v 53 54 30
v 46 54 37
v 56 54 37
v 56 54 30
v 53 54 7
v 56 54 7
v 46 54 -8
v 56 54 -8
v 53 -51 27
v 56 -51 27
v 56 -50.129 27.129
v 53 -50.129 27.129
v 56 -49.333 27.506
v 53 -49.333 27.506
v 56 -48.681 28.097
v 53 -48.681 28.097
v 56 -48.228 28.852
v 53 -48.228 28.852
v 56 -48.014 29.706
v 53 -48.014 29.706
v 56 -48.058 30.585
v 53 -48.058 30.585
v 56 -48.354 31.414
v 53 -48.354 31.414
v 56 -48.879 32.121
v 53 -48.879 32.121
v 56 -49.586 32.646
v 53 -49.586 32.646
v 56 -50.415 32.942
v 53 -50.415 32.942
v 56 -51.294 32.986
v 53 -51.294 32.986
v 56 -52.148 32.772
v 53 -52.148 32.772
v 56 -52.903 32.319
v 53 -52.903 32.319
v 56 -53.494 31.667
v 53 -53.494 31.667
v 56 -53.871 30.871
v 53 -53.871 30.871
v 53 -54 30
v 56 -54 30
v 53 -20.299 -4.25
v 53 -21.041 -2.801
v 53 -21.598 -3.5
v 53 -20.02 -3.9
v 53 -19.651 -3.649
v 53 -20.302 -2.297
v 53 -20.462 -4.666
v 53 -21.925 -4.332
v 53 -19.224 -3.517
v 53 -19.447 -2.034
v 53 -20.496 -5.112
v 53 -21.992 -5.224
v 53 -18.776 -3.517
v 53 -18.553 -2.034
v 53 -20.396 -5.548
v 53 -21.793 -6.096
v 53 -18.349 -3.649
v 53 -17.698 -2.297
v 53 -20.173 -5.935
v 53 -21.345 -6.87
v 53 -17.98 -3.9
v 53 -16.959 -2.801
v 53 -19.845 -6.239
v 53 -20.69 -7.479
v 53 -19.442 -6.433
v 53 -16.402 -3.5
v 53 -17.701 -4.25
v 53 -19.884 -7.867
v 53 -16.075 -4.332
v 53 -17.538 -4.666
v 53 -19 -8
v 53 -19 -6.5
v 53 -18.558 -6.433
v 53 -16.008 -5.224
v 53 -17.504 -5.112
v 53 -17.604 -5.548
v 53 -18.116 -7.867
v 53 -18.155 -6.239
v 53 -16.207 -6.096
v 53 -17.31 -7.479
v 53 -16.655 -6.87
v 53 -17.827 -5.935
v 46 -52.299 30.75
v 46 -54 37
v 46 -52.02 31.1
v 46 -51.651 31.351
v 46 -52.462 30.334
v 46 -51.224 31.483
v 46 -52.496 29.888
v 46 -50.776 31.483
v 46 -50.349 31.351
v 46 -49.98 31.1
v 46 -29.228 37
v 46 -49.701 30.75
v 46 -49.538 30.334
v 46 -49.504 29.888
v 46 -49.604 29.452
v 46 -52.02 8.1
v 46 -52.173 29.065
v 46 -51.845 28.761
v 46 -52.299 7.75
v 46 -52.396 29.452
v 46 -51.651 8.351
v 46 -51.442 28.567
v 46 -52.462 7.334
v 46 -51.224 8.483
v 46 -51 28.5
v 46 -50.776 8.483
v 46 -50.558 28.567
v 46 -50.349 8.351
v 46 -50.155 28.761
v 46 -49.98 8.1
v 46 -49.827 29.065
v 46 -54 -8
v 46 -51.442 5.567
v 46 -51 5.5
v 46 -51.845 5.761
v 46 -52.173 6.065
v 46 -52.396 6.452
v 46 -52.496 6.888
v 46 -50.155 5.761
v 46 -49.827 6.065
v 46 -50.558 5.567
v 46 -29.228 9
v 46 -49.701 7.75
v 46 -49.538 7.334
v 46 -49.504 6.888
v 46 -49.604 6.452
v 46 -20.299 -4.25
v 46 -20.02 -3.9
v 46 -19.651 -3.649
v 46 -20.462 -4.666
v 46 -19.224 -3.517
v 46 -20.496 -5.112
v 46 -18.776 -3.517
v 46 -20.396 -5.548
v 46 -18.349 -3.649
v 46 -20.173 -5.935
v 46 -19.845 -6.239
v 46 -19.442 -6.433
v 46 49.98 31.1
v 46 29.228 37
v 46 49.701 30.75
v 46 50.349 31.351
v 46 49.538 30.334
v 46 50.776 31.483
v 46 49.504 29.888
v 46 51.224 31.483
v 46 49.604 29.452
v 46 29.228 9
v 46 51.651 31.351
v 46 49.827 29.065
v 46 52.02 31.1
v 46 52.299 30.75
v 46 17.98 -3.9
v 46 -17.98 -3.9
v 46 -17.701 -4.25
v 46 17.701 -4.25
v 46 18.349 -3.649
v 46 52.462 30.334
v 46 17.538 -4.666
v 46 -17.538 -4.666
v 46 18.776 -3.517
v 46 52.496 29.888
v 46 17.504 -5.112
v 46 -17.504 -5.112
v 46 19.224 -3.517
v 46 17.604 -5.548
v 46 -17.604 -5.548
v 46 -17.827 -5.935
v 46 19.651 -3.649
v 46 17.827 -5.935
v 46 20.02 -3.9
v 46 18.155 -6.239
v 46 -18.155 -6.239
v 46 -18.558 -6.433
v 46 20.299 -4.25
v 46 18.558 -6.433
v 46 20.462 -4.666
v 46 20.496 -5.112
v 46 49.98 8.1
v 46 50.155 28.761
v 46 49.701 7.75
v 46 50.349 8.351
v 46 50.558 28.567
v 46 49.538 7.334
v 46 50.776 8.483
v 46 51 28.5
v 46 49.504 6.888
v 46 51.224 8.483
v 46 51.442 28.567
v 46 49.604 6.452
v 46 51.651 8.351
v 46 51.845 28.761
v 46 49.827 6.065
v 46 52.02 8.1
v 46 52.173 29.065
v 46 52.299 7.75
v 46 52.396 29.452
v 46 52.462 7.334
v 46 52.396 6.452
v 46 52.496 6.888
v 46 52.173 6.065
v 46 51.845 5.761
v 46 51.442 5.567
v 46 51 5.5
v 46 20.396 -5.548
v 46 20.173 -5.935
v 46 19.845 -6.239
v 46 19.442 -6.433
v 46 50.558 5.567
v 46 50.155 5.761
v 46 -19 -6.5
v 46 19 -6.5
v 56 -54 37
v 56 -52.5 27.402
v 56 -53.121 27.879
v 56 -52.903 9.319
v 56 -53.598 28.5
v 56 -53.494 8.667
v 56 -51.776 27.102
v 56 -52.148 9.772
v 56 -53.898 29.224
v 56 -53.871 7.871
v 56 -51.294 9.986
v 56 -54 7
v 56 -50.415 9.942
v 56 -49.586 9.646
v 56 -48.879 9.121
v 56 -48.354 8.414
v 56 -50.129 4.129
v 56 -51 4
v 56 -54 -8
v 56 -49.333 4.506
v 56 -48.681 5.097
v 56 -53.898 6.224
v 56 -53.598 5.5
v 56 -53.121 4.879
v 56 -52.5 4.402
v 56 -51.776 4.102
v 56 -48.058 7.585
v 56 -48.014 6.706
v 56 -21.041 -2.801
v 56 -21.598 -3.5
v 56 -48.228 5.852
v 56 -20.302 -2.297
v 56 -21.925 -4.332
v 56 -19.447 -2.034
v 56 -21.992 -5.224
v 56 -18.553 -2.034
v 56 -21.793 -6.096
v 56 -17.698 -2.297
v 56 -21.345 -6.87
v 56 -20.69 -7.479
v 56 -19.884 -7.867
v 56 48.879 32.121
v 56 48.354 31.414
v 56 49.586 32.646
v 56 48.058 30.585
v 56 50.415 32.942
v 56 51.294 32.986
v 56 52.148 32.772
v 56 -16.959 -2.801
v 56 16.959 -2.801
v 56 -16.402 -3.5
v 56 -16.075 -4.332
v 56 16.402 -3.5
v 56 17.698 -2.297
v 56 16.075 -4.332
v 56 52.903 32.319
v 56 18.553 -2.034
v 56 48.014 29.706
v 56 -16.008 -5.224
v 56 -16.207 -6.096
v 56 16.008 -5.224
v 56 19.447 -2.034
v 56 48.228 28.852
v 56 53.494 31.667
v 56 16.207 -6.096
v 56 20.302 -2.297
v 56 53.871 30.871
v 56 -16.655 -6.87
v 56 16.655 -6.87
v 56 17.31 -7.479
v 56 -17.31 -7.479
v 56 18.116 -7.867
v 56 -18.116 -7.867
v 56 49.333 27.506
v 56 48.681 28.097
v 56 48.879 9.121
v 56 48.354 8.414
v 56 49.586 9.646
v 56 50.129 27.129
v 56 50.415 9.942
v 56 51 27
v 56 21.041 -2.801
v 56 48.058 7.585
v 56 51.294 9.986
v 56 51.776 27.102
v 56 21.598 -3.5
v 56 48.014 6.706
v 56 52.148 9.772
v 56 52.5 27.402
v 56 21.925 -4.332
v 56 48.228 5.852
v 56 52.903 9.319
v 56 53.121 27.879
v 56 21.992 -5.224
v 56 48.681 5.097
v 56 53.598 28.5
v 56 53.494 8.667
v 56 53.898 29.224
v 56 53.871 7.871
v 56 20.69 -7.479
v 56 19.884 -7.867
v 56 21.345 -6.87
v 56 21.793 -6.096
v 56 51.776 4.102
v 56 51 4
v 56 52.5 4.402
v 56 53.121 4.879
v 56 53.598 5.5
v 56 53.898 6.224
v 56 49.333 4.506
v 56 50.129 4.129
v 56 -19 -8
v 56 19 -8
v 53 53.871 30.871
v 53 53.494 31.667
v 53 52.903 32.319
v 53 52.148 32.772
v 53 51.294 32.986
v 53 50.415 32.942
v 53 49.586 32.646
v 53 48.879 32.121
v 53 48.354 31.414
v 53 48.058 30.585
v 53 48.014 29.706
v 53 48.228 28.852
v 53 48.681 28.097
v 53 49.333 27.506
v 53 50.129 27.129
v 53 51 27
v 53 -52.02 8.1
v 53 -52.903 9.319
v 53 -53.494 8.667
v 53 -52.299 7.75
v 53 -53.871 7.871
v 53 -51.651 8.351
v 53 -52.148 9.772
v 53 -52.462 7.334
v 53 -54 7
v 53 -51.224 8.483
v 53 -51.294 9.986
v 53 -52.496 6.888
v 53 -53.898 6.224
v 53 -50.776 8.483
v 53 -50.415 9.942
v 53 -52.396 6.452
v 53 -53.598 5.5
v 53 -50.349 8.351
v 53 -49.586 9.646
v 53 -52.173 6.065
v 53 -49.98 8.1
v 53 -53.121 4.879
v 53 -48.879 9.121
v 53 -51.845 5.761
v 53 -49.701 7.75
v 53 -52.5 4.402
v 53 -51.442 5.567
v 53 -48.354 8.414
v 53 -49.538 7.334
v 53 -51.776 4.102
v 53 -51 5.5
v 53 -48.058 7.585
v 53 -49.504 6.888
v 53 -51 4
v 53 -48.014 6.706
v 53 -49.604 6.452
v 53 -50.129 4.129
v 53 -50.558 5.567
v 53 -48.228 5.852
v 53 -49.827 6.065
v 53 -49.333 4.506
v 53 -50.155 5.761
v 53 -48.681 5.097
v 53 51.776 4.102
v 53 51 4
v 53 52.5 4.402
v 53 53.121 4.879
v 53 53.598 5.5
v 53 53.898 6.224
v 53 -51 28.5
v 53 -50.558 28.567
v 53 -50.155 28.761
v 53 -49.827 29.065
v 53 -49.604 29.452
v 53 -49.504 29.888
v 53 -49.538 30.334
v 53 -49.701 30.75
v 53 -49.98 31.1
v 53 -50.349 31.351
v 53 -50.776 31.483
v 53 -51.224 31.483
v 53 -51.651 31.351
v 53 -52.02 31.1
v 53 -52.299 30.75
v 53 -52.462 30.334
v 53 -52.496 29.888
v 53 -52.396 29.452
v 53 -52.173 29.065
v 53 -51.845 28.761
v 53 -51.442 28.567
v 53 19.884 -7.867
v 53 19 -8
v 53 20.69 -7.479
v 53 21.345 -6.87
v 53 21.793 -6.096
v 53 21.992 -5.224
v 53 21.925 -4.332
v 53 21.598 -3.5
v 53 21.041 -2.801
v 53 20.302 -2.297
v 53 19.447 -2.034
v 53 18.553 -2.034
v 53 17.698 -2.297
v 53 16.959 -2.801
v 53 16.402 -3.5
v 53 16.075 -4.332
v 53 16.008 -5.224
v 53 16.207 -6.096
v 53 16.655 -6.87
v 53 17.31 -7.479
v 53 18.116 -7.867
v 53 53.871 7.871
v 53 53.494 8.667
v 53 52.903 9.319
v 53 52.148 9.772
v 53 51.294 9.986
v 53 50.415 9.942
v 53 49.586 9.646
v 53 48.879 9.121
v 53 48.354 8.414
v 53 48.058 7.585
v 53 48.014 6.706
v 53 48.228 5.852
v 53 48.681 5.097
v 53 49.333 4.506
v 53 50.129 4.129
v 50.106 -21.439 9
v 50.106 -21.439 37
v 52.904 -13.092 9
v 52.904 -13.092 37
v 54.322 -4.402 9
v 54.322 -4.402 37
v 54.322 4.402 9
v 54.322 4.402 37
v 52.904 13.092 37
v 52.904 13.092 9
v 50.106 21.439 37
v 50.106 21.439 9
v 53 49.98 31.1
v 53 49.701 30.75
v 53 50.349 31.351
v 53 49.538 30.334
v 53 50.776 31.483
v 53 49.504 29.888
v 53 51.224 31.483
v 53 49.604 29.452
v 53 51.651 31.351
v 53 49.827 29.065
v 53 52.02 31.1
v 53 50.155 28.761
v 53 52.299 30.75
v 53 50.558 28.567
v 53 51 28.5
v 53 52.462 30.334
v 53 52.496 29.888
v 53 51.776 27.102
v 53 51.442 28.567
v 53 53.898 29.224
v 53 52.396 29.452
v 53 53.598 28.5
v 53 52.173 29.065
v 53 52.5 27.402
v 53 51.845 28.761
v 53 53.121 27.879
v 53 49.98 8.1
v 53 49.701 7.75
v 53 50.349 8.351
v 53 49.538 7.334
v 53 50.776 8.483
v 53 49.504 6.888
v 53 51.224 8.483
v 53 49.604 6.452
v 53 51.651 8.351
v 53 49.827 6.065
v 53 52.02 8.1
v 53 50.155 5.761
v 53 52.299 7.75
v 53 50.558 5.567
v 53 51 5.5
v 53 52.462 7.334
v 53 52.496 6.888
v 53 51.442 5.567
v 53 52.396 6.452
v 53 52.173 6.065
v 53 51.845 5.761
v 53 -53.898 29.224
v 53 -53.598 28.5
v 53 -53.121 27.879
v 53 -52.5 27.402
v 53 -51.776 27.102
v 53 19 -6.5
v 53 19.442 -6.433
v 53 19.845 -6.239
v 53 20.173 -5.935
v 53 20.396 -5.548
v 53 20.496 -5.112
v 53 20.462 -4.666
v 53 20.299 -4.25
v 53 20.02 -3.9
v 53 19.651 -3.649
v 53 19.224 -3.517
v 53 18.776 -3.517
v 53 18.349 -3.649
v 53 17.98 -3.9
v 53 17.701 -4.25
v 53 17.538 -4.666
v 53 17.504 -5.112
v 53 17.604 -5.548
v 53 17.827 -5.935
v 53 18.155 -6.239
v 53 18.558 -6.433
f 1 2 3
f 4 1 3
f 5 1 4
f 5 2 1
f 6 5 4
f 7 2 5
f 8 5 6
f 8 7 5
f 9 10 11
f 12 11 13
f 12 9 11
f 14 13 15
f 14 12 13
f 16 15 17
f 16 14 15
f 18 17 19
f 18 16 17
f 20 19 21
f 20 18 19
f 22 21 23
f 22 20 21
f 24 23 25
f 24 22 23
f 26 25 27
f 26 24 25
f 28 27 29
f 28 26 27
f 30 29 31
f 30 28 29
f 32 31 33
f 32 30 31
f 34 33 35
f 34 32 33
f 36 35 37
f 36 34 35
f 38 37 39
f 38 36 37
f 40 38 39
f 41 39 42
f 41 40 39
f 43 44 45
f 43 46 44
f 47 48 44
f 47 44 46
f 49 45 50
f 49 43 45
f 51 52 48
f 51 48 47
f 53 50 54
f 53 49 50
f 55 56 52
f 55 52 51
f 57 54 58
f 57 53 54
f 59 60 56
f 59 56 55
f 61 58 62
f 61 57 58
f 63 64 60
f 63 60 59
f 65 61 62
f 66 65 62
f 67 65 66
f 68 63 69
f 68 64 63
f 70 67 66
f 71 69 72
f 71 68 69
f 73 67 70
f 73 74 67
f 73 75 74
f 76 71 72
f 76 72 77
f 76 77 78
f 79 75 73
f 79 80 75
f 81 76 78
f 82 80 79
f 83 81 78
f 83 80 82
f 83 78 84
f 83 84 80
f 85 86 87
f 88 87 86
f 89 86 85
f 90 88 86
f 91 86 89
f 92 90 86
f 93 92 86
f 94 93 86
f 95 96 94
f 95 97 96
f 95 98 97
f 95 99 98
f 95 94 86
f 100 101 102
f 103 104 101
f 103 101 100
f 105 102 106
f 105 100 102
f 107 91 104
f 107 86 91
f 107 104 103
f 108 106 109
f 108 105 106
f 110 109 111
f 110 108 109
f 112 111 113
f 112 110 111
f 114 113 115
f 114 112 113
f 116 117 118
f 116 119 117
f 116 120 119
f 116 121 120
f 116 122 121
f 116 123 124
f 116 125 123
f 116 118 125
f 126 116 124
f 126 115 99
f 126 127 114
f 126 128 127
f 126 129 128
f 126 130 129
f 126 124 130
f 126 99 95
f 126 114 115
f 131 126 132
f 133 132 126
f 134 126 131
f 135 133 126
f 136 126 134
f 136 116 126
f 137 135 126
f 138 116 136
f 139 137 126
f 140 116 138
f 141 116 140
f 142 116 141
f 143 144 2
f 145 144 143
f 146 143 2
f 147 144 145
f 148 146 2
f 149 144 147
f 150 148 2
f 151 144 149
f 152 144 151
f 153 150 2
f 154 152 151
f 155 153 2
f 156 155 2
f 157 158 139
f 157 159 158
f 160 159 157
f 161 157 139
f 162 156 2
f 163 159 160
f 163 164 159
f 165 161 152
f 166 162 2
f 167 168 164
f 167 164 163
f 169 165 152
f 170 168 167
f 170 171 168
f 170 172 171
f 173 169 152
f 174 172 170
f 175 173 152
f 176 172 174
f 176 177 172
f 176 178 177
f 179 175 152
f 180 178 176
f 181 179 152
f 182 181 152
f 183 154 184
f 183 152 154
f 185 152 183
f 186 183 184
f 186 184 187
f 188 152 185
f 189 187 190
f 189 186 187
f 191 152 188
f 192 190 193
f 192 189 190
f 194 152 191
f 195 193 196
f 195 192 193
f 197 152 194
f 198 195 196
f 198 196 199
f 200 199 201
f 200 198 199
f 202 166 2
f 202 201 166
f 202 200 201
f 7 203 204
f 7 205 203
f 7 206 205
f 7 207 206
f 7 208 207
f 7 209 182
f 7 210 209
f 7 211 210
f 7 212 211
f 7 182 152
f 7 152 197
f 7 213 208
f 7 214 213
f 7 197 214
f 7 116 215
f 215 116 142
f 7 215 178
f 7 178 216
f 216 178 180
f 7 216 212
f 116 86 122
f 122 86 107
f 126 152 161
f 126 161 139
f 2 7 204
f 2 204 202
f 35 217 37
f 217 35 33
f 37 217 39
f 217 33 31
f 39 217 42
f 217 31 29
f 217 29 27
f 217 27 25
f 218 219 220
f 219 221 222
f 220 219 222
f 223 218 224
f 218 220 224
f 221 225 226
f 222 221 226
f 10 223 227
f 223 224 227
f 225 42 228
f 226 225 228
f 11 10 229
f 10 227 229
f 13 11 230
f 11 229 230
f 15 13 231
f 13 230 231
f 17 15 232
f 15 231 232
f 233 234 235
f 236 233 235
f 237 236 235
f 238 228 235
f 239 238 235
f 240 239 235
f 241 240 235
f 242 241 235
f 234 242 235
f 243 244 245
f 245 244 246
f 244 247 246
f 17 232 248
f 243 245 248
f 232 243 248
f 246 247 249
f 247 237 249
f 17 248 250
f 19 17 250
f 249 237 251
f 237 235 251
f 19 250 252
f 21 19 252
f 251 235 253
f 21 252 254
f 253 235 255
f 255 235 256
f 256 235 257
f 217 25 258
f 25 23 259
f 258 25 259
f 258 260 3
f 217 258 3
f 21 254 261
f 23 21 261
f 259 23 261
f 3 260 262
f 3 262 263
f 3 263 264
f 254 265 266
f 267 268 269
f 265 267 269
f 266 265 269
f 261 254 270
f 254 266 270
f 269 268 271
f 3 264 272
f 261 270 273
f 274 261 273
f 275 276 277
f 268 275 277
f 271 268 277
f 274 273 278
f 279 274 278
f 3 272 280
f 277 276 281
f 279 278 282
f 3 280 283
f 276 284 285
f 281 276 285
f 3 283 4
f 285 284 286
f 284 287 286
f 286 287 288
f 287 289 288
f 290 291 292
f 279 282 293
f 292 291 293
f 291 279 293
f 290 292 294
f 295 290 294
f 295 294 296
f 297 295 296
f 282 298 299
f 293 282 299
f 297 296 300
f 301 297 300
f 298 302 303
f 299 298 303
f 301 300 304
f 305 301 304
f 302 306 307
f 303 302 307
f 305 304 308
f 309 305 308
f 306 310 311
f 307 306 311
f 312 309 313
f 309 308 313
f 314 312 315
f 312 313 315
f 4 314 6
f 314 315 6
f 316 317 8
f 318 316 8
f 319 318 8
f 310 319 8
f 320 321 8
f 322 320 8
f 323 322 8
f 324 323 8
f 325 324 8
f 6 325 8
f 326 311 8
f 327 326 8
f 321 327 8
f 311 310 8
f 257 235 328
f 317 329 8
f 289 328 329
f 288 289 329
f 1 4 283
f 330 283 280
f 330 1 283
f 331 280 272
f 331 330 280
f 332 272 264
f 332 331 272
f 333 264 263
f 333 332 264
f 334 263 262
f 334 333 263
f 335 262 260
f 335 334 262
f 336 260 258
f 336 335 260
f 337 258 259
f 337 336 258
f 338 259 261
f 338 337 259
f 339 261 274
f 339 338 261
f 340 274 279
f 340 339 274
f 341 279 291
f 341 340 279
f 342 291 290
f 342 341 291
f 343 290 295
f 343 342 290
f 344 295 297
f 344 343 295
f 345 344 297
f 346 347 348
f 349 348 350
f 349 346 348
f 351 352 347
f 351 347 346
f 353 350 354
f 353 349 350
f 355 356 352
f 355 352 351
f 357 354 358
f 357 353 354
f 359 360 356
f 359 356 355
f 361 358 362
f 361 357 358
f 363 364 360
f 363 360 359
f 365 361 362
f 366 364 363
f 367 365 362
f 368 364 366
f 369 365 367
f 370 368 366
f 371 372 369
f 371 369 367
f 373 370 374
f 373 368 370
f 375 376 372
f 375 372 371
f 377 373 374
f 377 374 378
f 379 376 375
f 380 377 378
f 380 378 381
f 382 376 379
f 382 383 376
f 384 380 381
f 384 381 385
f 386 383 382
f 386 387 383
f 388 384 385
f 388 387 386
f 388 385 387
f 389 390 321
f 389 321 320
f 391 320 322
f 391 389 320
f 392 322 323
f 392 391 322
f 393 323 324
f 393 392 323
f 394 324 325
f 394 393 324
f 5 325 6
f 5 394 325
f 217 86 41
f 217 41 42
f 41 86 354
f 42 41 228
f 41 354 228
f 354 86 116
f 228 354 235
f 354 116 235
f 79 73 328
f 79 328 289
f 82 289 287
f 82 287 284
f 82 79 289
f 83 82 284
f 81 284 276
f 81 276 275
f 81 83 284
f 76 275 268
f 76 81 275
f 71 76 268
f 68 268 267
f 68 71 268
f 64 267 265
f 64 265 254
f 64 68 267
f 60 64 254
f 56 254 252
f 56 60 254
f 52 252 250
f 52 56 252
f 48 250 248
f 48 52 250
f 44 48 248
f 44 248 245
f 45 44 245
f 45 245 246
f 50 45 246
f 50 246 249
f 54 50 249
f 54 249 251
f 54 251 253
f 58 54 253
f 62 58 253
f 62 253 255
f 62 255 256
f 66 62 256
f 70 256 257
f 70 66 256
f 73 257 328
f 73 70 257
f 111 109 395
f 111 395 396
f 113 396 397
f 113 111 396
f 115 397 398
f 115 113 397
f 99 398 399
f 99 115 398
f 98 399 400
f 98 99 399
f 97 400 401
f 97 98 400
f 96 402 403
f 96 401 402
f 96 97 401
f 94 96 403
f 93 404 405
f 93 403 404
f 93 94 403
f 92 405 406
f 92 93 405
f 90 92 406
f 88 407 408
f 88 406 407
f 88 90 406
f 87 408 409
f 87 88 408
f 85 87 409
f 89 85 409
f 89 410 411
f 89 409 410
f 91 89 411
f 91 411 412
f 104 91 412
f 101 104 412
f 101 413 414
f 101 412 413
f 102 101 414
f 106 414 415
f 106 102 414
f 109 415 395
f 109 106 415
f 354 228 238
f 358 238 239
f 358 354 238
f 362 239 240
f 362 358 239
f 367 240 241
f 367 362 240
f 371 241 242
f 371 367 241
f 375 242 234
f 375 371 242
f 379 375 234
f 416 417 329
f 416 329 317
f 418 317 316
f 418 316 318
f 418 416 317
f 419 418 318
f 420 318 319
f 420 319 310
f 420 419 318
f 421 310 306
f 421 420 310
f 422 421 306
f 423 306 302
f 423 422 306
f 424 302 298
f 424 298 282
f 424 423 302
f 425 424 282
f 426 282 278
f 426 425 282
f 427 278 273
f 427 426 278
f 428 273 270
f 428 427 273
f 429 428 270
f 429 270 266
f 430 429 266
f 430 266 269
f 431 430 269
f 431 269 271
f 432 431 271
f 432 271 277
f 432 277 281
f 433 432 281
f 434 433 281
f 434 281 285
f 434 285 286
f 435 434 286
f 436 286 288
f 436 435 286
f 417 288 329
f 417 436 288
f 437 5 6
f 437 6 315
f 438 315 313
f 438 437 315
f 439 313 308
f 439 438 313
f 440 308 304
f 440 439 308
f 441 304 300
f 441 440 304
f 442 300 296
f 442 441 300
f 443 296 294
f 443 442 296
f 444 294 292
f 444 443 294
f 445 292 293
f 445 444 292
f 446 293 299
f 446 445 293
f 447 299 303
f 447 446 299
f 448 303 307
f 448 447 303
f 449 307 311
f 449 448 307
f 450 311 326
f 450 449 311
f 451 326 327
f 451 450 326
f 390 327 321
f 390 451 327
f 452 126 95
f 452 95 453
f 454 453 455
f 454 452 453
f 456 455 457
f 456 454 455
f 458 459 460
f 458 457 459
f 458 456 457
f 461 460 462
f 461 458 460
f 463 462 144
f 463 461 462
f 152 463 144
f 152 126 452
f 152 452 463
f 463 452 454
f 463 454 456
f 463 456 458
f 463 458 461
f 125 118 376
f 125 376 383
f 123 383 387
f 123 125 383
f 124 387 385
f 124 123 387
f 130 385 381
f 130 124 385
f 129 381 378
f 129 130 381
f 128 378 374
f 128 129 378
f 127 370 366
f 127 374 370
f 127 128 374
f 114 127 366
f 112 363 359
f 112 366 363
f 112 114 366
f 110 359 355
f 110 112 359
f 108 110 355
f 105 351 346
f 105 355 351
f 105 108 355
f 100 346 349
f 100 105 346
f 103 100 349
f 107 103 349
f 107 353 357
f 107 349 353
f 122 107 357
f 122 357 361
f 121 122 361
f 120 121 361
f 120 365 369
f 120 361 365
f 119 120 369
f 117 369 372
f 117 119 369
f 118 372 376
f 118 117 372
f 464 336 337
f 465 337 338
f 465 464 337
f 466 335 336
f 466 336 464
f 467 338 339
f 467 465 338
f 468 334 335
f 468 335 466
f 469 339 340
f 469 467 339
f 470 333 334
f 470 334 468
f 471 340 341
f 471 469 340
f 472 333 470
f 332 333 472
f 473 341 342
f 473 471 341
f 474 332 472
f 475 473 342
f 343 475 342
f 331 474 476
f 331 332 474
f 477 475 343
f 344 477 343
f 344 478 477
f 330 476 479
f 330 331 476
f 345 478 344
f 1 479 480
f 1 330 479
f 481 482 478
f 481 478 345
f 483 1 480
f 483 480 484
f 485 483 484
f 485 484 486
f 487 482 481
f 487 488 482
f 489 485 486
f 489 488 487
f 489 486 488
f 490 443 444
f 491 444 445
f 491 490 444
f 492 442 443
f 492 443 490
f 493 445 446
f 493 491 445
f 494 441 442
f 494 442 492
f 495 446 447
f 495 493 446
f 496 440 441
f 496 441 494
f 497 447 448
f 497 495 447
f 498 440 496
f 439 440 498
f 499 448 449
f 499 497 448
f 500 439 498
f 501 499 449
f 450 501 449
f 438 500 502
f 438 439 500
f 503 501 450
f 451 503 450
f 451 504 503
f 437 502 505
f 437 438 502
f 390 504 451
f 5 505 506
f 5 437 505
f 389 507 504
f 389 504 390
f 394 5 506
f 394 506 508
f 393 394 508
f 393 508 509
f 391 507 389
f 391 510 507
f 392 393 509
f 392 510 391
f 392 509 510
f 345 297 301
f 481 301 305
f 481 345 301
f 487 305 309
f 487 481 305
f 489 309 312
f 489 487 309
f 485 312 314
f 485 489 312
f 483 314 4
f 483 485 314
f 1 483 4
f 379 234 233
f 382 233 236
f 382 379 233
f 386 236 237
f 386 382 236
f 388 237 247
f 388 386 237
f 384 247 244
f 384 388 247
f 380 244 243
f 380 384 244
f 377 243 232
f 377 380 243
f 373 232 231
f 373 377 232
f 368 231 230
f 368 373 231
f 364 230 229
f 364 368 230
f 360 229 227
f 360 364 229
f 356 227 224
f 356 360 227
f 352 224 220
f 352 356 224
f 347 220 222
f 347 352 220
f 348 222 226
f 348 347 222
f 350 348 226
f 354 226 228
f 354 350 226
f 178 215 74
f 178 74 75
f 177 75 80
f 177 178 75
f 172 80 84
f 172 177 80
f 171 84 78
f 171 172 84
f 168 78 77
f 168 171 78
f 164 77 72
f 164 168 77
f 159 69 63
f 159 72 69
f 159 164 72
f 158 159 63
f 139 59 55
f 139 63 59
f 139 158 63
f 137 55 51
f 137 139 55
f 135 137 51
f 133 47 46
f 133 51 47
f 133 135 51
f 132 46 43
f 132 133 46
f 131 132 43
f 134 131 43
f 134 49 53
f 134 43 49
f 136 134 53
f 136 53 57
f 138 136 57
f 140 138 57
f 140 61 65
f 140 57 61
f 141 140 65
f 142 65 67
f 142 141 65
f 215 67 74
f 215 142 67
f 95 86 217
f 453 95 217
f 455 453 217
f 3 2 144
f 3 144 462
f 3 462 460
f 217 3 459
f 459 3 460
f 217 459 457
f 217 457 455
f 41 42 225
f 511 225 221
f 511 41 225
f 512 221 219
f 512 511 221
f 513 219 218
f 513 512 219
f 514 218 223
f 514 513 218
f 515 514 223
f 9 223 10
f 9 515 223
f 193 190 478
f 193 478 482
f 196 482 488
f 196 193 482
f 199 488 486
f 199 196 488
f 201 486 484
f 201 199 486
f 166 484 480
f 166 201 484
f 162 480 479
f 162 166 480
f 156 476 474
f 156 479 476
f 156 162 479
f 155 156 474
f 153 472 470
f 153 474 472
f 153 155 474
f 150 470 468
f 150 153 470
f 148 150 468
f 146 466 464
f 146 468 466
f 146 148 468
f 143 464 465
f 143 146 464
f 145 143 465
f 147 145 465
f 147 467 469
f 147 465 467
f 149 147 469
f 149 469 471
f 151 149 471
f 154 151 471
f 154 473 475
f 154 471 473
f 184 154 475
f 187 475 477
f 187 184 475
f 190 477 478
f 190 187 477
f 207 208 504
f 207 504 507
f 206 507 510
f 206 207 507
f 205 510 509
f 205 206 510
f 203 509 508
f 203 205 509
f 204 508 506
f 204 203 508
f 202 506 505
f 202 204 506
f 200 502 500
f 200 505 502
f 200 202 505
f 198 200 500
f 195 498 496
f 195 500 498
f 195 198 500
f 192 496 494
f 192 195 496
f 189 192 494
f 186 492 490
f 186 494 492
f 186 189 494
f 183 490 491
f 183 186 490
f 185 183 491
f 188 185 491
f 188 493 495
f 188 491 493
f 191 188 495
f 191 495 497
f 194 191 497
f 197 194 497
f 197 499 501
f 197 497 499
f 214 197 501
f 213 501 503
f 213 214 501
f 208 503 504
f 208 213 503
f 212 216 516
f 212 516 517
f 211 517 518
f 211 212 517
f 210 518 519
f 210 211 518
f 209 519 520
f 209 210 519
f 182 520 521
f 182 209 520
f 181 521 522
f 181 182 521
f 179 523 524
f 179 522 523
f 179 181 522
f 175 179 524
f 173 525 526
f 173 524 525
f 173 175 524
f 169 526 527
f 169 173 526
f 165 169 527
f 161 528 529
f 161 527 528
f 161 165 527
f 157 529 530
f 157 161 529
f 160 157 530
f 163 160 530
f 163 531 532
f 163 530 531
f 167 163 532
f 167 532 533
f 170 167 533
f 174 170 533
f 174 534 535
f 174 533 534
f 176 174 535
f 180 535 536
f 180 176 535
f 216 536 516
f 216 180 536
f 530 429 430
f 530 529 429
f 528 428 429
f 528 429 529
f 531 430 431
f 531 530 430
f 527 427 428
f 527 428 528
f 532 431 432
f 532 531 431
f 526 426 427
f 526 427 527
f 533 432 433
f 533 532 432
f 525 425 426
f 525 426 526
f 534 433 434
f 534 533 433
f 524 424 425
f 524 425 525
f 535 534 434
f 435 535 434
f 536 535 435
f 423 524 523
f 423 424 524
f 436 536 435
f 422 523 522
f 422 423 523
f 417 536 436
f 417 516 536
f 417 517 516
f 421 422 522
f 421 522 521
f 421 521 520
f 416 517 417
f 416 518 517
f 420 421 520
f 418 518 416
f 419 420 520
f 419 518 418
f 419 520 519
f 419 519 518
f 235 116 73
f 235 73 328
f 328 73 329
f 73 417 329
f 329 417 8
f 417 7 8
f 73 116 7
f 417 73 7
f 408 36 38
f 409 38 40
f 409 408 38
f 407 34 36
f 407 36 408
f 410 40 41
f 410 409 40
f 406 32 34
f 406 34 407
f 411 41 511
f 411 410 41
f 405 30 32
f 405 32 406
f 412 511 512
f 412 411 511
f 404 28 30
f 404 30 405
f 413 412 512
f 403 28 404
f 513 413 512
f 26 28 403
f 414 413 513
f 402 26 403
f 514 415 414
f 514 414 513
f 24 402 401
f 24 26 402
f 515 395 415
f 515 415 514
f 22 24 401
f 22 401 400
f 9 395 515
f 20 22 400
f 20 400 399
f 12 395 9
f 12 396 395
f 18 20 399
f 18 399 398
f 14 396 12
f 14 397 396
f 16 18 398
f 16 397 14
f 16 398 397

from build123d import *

# Parameters (mm, degrees)
CYLINDER294_R     = 54.5
CYLINDER294_DEPTH = 28
CYLINDER289_R     = 1.5
CYLINDER289_DEPTH = 20
CYLINDER290_R     = 1.5
CYLINDER290_DEPTH = 20
CYLINDER291_R     = 1.5
CYLINDER291_DEPTH = 20
CYLINDER292_R     = 1.5
CYLINDER292_DEPTH = 20
CYLINDER293_R     = 1.5
CYLINDER293_DEPTH = 20
CYLINDER288_R     = 1.5
CYLINDER288_DEPTH = 20
CYLINDER299_R     = 3
CYLINDER299_DEPTH = 3
CYLINDER298_R     = 3
CYLINDER298_DEPTH = 3
CYLINDER297_R     = 3
CYLINDER297_DEPTH = 3
CYLINDER296_R     = 3
CYLINDER296_DEPTH = 3
CYLINDER295_R     = 3
CYLINDER295_DEPTH = 3
CYLINDER300_R     = 3
CYLINDER300_DEPTH = 3
BOX133_W          = 10
BOX133_H          = 108
BOX133_DEPTH      = 45


with BuildPart() as v_lec294:
    # Cylinder294 → Cylinder294 (new body)
    with BuildSketch(Plane.XY.offset(9)):
        Circle(CYLINDER294_R)
    extrude(amount=CYLINDER294_DEPTH)


with BuildPart() as v_lec289:
    # Cylinder289 → Cylinder289 (new body)
    with BuildSketch(Plane(origin=(45, -19, -5), x_dir=(0, 0, -1), z_dir=(1, 0, 0))):
        Circle(CYLINDER289_R)
    extrude(amount=CYLINDER289_DEPTH)


with BuildPart() as v_lec290:
    # Cylinder290 → Cylinder290 (new body)
    with BuildSketch(Plane(origin=(45, 51, 7), x_dir=(0, 0, -1), z_dir=(1, 0, 0))):
        Circle(CYLINDER290_R)
    extrude(amount=CYLINDER290_DEPTH)


with BuildPart() as v_lec291:
    # Cylinder291 → Cylinder291 (new body)
    with BuildSketch(Plane(origin=(45, -51, 7), x_dir=(0, 0, -1), z_dir=(1, 0, 0))):
        Circle(CYLINDER291_R)
    extrude(amount=CYLINDER291_DEPTH)


with BuildPart() as v_lec292:
    # Cylinder292 → Cylinder292 (new body)
    with BuildSketch(Plane(origin=(45, -51, 30), x_dir=(0, 0, -1), z_dir=(1, 0, 0))):
        Circle(CYLINDER292_R)
    extrude(amount=CYLINDER292_DEPTH)


with BuildPart() as v_lec293:
    # Cylinder293 → Cylinder293 (new body)
    with BuildSketch(Plane(origin=(45, 51, 30), x_dir=(0, 0, -1), z_dir=(1, 0, 0))):
        Circle(CYLINDER293_R)
    extrude(amount=CYLINDER293_DEPTH)


with BuildPart() as compound582:
    # Cylinder288 → Cylinder288 (new body)
    with BuildSketch(Plane(origin=(45, 19, -5), x_dir=(0, 0, -1), z_dir=(1, 0, 0))):
        Circle(CYLINDER288_R)
    extrude(amount=CYLINDER288_DEPTH)

    # Compound582: union Válec289, Válec290, Válec291, Válec292, Válec293
    add(v_lec289.part)
    add(v_lec290.part)
    add(v_lec291.part)
    add(v_lec292.part)
    add(v_lec293.part)


with BuildPart() as v_lec299:
    # Cylinder299 → Cylinder299 (new body)
    with BuildSketch(Plane(origin=(53, -19, -5), x_dir=(0, 0, -1), z_dir=(1, 0, 0))):
        Circle(CYLINDER299_R)
    extrude(amount=CYLINDER299_DEPTH)


with BuildPart() as v_lec298:
    # Cylinder298 → Cylinder298 (new body)
    with BuildSketch(Plane(origin=(53, 51, 7), x_dir=(0, 0, -1), z_dir=(1, 0, 0))):
        Circle(CYLINDER298_R)
    extrude(amount=CYLINDER298_DEPTH)


with BuildPart() as v_lec297:
    # Cylinder297 → Cylinder297 (new body)
    with BuildSketch(Plane(origin=(53, -51, 7), x_dir=(0, 0, -1), z_dir=(1, 0, 0))):
        Circle(CYLINDER297_R)
    extrude(amount=CYLINDER297_DEPTH)


with BuildPart() as v_lec296:
    # Cylinder296 → Cylinder296 (new body)
    with BuildSketch(Plane(origin=(53, -51, 30), x_dir=(0, 0, -1), z_dir=(1, 0, 0))):
        Circle(CYLINDER296_R)
    extrude(amount=CYLINDER296_DEPTH)


with BuildPart() as v_lec295:
    # Cylinder295 → Cylinder295 (new body)
    with BuildSketch(Plane(origin=(53, 51, 30), x_dir=(0, 0, -1), z_dir=(1, 0, 0))):
        Circle(CYLINDER295_R)
    extrude(amount=CYLINDER295_DEPTH)


with BuildPart() as compound583:
    # Cylinder300 → Cylinder300 (new body)
    with BuildSketch(Plane(origin=(53, 19, -5), x_dir=(0, 0, -1), z_dir=(1, 0, 0))):
        Circle(CYLINDER300_R)
    extrude(amount=CYLINDER300_DEPTH)

    # Compound583: union Válec299, Válec298, Válec297, Válec296, Válec295
    add(v_lec299.part)
    add(v_lec298.part)
    add(v_lec297.part)
    add(v_lec296.part)
    add(v_lec295.part)


with BuildPart() as cut359:
    # Box133 → Box133 (new body)
    with BuildSketch(Plane(origin=(46, -54, -8), x_dir=(1, 0, 0), z_dir=(0, 0, 1))):
        with Locations((5, 54)):
            Rectangle(BOX133_W, BOX133_H)
    extrude(amount=BOX133_DEPTH)

    # Cut358: cut Compound583
    add(compound583.part, mode=Mode.SUBTRACT)

    # Cut360: cut Compound582
    add(compound582.part, mode=Mode.SUBTRACT)

    # Cut359: cut Válec294
    add(v_lec294.part, mode=Mode.SUBTRACT)


solid = cut359.part
